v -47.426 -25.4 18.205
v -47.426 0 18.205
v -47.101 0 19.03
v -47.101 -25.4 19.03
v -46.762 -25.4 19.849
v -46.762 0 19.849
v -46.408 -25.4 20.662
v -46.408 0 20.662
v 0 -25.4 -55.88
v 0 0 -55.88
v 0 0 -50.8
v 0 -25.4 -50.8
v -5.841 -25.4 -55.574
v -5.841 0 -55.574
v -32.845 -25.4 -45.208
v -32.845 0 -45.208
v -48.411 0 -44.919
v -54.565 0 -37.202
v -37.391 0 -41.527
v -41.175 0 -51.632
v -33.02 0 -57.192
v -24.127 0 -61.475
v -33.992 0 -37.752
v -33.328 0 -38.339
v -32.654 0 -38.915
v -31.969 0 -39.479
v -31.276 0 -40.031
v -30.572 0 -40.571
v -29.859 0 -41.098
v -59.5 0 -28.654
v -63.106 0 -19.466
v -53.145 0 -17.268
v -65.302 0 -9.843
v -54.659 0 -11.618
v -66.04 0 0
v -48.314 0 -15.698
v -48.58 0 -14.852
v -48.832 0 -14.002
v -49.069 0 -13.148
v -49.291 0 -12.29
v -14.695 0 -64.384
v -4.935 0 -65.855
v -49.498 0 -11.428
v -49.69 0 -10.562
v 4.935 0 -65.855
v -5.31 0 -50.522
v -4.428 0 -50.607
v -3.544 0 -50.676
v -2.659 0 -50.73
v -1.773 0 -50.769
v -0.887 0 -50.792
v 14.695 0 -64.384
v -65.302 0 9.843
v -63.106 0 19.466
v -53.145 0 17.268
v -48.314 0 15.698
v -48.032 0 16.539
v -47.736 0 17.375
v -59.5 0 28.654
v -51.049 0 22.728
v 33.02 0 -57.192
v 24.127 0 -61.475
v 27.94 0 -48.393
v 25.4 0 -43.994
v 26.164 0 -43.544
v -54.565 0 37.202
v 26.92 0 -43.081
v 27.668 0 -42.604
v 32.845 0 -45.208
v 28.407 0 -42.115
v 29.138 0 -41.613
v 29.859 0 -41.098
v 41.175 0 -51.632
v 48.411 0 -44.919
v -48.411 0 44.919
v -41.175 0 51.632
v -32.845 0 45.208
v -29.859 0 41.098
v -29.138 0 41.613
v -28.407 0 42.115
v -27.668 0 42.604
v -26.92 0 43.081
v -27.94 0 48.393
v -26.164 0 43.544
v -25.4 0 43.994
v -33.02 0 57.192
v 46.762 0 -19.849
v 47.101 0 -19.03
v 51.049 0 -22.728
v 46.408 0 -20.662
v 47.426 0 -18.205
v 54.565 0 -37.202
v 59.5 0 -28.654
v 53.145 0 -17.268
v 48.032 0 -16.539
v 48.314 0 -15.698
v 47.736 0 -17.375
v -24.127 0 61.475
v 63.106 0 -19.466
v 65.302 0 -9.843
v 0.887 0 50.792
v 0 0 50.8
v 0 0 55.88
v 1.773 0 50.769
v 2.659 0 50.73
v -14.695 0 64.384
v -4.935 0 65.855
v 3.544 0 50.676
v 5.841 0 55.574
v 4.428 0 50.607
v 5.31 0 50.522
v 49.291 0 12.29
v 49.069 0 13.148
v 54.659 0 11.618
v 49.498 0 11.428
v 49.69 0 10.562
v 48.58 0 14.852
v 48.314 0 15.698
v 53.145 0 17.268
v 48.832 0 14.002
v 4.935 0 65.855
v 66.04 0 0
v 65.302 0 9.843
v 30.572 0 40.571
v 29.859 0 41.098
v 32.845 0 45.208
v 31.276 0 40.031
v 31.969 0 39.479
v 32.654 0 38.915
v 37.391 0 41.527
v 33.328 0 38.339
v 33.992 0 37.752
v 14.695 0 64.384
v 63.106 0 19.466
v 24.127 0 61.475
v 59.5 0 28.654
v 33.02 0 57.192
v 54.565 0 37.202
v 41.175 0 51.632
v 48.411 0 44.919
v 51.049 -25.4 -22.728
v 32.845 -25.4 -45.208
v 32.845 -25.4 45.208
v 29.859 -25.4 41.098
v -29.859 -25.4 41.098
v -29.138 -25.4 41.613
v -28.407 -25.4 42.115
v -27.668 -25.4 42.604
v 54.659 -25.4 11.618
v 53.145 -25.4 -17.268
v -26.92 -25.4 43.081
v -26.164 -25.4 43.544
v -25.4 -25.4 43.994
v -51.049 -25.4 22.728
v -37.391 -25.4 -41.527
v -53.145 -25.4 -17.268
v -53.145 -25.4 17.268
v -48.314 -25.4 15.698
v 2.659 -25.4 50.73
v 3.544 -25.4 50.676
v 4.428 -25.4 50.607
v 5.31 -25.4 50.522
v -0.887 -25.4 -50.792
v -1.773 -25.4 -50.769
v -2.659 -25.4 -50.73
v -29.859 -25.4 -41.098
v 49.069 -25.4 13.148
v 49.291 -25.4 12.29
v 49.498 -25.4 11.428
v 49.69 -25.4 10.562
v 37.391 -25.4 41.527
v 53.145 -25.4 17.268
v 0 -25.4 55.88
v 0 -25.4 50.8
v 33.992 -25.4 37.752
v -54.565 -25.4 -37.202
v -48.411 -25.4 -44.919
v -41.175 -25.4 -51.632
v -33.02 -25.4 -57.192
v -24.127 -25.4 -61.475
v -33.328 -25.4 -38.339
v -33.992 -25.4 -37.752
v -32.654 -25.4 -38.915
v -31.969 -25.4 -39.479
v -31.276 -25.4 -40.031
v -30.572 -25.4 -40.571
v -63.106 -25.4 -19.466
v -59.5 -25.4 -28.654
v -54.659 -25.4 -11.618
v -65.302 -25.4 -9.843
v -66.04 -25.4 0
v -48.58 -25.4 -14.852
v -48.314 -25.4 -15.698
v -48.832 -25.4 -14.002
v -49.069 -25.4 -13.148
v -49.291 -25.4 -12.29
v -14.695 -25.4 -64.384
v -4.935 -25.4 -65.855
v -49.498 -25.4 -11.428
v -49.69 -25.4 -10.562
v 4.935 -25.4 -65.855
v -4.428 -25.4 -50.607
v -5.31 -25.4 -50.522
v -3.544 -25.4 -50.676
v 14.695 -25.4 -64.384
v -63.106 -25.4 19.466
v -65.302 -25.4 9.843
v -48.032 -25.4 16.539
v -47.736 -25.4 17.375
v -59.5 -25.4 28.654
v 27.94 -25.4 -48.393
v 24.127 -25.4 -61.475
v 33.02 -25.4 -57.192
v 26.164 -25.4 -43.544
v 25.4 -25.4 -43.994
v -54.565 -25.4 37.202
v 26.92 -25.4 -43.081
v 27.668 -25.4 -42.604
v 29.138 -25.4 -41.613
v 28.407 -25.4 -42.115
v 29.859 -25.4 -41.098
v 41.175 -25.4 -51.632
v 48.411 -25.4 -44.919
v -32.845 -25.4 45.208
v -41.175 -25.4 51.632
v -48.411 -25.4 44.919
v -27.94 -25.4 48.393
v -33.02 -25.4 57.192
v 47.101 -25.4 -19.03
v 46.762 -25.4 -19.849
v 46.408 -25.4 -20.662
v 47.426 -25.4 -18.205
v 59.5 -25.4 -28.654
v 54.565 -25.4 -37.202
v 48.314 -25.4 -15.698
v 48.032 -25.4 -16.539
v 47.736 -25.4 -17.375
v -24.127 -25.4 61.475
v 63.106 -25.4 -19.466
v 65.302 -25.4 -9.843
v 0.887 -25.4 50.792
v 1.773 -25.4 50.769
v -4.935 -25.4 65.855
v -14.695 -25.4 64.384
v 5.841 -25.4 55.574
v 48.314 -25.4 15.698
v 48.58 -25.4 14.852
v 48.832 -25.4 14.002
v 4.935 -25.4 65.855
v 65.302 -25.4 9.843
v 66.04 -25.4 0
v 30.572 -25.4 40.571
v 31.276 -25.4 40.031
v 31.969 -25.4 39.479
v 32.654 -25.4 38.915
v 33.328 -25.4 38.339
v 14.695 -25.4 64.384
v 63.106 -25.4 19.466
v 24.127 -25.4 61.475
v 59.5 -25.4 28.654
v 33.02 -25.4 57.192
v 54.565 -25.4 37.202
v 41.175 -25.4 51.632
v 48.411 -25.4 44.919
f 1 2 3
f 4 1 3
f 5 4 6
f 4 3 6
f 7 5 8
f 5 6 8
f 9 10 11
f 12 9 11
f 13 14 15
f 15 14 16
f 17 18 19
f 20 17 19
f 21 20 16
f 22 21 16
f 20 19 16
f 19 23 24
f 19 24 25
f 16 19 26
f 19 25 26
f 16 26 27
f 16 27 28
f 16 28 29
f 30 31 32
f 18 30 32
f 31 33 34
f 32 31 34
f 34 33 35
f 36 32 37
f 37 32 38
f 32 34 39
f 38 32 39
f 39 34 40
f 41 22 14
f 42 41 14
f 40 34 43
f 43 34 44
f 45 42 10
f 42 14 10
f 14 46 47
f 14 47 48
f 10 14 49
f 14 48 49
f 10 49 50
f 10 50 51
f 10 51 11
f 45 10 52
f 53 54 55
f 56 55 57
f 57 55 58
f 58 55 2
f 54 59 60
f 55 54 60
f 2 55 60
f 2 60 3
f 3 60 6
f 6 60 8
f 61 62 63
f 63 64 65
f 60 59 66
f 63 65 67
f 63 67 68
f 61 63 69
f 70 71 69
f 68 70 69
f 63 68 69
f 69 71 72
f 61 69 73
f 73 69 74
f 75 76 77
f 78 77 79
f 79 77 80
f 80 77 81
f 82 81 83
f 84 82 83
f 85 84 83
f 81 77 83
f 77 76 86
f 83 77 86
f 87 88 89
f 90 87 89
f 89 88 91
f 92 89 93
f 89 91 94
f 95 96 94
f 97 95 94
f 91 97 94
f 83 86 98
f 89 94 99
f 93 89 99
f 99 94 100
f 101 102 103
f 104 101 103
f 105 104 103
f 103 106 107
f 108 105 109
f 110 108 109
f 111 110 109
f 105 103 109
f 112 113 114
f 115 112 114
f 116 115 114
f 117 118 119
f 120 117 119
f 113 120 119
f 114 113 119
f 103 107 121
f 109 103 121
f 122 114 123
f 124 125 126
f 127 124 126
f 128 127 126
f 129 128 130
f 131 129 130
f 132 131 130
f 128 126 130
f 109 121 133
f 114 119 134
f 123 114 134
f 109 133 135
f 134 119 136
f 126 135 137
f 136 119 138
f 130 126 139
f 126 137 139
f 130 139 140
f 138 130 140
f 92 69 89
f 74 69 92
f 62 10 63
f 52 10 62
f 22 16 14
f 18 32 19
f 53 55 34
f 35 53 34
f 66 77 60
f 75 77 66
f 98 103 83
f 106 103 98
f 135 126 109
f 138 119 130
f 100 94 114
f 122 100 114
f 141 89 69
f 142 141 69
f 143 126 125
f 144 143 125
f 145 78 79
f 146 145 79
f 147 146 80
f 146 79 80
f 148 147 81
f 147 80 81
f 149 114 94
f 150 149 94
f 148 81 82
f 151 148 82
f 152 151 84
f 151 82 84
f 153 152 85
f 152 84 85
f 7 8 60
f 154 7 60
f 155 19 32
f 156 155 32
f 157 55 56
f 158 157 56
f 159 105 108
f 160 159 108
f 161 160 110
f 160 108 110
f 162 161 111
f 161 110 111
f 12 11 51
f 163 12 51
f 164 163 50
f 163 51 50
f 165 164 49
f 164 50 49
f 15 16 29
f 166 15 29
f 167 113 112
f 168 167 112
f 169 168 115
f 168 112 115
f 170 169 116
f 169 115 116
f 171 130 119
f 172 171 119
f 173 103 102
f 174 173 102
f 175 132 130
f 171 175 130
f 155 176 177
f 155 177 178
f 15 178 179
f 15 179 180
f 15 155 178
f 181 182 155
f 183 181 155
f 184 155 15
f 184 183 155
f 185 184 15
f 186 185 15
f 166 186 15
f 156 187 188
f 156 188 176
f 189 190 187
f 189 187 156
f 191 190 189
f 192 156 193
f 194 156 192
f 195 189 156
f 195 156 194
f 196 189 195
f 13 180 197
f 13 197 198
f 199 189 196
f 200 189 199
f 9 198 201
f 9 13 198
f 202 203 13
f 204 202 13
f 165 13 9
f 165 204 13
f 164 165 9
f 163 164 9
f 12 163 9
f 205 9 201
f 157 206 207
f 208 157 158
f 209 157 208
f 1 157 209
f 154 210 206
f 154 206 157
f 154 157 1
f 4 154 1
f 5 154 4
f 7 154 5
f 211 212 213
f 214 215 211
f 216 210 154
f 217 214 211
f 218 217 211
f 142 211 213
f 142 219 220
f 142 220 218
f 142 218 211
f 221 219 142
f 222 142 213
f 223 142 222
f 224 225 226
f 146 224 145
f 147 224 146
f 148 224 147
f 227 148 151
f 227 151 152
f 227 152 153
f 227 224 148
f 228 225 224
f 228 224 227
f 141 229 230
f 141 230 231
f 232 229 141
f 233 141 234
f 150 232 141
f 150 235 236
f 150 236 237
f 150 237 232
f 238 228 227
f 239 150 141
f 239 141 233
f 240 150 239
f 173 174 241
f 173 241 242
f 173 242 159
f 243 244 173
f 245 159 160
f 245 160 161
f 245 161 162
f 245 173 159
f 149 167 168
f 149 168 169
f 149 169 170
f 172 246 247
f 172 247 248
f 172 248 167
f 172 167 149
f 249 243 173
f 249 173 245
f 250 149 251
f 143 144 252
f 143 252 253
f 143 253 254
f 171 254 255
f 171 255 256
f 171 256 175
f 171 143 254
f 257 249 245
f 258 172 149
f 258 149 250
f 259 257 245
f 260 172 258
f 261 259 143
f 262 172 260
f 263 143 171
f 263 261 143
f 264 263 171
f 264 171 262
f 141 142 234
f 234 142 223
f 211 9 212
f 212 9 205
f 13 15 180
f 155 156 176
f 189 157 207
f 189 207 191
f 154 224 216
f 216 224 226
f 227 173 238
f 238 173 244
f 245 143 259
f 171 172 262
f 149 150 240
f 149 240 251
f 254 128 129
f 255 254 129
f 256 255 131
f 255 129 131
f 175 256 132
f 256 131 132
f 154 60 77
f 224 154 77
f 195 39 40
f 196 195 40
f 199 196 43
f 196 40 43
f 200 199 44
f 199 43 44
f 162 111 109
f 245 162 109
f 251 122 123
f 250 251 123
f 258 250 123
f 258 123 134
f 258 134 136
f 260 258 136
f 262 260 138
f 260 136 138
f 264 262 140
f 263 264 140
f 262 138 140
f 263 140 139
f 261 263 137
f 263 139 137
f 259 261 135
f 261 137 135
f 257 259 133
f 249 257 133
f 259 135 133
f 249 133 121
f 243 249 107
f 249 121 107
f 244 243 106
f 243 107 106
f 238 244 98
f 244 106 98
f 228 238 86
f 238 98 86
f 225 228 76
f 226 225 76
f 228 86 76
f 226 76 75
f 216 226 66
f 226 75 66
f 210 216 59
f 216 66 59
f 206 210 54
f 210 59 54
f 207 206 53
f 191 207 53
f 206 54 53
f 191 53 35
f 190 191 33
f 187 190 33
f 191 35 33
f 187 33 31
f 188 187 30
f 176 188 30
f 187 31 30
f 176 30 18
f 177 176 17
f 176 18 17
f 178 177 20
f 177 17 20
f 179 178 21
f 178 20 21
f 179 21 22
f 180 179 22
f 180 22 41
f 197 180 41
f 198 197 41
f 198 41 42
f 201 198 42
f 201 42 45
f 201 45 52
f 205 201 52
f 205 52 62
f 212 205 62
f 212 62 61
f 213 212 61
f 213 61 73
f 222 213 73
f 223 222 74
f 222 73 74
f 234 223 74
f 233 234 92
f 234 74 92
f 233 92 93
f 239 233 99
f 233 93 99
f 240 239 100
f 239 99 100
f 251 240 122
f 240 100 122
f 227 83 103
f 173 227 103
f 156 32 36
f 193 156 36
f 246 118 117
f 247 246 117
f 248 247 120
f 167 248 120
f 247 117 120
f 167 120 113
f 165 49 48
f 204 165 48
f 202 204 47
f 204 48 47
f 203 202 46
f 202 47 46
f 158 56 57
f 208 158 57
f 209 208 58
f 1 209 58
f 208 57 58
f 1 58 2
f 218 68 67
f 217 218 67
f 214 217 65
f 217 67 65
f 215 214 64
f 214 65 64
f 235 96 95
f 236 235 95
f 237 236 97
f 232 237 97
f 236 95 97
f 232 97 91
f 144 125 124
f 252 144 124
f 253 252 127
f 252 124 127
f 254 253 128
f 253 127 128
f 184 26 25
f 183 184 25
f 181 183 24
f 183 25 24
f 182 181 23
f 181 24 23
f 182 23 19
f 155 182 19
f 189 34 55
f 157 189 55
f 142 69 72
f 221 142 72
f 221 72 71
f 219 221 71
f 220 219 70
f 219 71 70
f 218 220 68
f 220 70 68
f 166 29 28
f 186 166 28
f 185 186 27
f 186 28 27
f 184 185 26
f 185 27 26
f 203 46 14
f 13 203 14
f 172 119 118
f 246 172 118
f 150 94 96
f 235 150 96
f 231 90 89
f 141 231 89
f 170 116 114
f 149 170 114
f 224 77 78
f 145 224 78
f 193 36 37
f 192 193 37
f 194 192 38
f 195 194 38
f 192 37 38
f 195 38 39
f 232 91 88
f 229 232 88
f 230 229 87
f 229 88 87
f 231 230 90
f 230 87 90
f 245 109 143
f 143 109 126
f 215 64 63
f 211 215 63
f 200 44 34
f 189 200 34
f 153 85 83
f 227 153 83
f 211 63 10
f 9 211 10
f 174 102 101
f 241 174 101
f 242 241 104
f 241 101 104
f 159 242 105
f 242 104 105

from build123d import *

# Parameters (mm, degrees)
F0_R     = 66.04
F1_DEPTH = 25.4


with BuildPart() as f1:
    # F0 (on Front) → F1 (new body)
    with BuildSketch(Plane.XZ):
        Circle(F0_R)
        with BuildLine():
            ThreePointArc((53.975935173, 14.4628082403), (54.3360311518, 13.0449269323), (54.658887929, 11.6181052829))
            ThreePointArc((54.658887929, 11.6181052829), (55.5738835132, 5.8410505274), (55.88, 0))
            ThreePointArc((55.88, 0), (55.1920244725, -8.7415579064), (53.1450381306, -17.2678696457))
            ThreePointArc((53.1450381306, -17.2678696457), (52.6748065222, -18.653127294), (52.1684742327, -20.0256010206))
            ThreePointArc((52.1684742327, -20.0256010206), (51.6263882767, -21.3843502006), (51.0489201731, -22.7284436151))
            ThreePointArc((51.0489201731, -22.7284436151), (43.4269163262, -35.1664234519), (32.8454398981, -45.2078696457))
            ThreePointArc((32.8454398981, -45.2078696457), (31.6507805194, -46.0521714202), (30.4344292766, -46.8649113368))
            ThreePointArc((30.4344292766, -46.8649113368), (29.1972197963, -47.6455323841), (27.94, -48.3934995635))
            ThreePointArc((27.94, -48.3934995635), (14.4628082403, -53.975935173), (0, -55.88))
            ThreePointArc((0, -55.88), (-1.4627678714, -55.8608513196), (-2.9245332349, -55.8034184021))
            ThreePointArc((-2.9245332349, -55.8034184021), (-4.3842942693, -55.707740609), (-5.8410505274, -55.5738835132))
            ThreePointArc((-5.8410505274, -55.5738835132), (-20.0256010206, -52.1684742327), (-32.8454398981, -45.2078696457))
            ThreePointArc((-32.8454398981, -45.2078696457), (-34.017588653, -44.3325846555), (-35.1664234519, -43.4269163262))
            ThreePointArc((-35.1664234519, -43.4269163262), (-36.2911569407, -42.4914853577), (-37.3910182833, -41.5269328477))
            ThreePointArc((-37.3910182833, -41.5269328477), (-46.8649113368, -30.4344292766), (-53.1450381306, -17.2678696457))
            ThreePointArc((-53.1450381306, -17.2678696457), (-53.5788467844, -15.8707774621), (-53.975935173, -14.4628082403))
            ThreePointArc((-53.975935173, -14.4628082403), (-54.3360311518, -13.0449269323), (-54.658887929, -11.6181052829))
            ThreePointArc((-54.658887929, -11.6181052829), (-55.8034184021, 2.9245332349), (-53.1450381306, 17.2678696457))
            ThreePointArc((-53.1450381306, 17.2678696457), (-52.6748065222, 18.653127294), (-52.1684742327, 20.0256010206))
            ThreePointArc((-52.1684742327, 20.0256010206), (-51.6263882767, 21.3843502006), (-51.0489201731, 22.7284436151))
            ThreePointArc((-51.0489201731, 22.7284436151), (-43.4269163262, 35.1664234519), (-32.8454398981, 45.2078696457))
            ThreePointArc((-32.8454398981, 45.2078696457), (-31.6507805194, 46.0521714202), (-30.4344292766, 46.8649113368))
            ThreePointArc((-30.4344292766, 46.8649113368), (-29.1972197963, 47.6455323841), (-27.94, 48.3934995635))
            ThreePointArc((-27.94, 48.3934995635), (-14.4628082403, 53.975935173), (0, 55.88))
            ThreePointArc((0, 55.88), (1.4627678714, 55.8608513196), (2.9245332349, 55.8034184021))
            ThreePointArc((2.9245332349, 55.8034184021), (4.3842942693, 55.707740609), (5.8410505274, 55.5738835132))
            ThreePointArc((5.8410505274, 55.5738835132), (20.0256010206, 52.1684742327), (32.8454398981, 45.2078696457))
            ThreePointArc((32.8454398981, 45.2078696457), (34.017588653, 44.3325846555), (35.1664234519, 43.4269163262))
            ThreePointArc((35.1664234519, 43.4269163262), (36.2911569407, 42.4914853577), (37.3910182833, 41.5269328477))
            ThreePointArc((37.3910182833, 41.5269328477), (46.8649113368, 30.4344292766), (53.1450381306, 17.2678696457))
            ThreePointArc((53.1450381306, 17.2678696457), (53.5788467844, 15.8707774621), (53.975935173, 14.4628082403))
        make_face(mode=Mode.SUBTRACT)
        with BuildLine():
            Line((-52.1684742327, 20.0256010206), (-47.4258856661, 18.2050918369))
            ThreePointArc((-47.4258856661, 18.2050918369), (-46.9330802516, 19.4403183641), (-46.4081092482, 20.6622214682))
            Line((-46.4081092482, 20.6622214683), (-51.0489201731, 22.7284436151))
            ThreePointArc((-51.0489201731, 22.7284436151), (-51.6263882767, 21.3843502006), (-52.1684742327, 20.0256010206))
        make_face()
        with BuildLine():
            ThreePointArc((-48.3136710278, 15.6980633142), (-47.8861877475, 16.9573884491), (-47.4258856661, 18.2050918369))
            Line((-47.4258856661, 18.2050918369), (-52.1684742327, 20.0256010206))
            ThreePointArc((-52.1684742327, 20.0256010206), (-52.6748065222, 18.653127294), (-53.1450381306, 17.2678696457))
            Line((-53.1450381306, 17.2678696457), (-48.3136710278, 15.6980633142))
        make_face()
        with BuildLine():
            Line((-30.4344292766, 46.8649113368), (-27.6676629788, 42.6044648516))
            ThreePointArc((-27.6676629788, 42.6044648516), (-26.5429270876, 43.3141203492), (-25.4, 43.9940905122))
            Line((-25.4, 43.9940905122), (-27.94, 48.3934995635))
            ThreePointArc((-27.94, 48.3934995635), (-29.1972197963, 47.6455323841), (-30.4344292766, 46.8649113368))
        make_face()
        with BuildLine():
            ThreePointArc((-29.8594908165, 41.0980633142), (-28.7734368358, 41.865610382), (-27.6676629788, 42.6044648516))
            Line((-27.6676629788, 42.6044648516), (-30.4344292766, 46.8649113368))
            ThreePointArc((-30.4344292766, 46.8649113368), (-31.6507805194, 46.0521714202), (-32.8454398981, 45.2078696457))
            Line((-32.8454398981, 45.2078696457), (-29.8594908165, 41.0980633142))
        make_face()
        with BuildLine():
            Line((2.9245332349, 55.8034184021), (2.6586665771, 50.7303803655))
            ThreePointArc((2.6586665771, 50.7303803655), (3.985722063, 50.6434005536), (5.310045934, 50.5217122847))
            Line((5.310045934, 50.5217122847), (5.8410505274, 55.5738835132))
            ThreePointArc((5.8410505274, 55.5738835132), (4.3842942693, 55.707740609), (2.9245332349, 55.8034184021))
        make_face()
        with BuildLine():
            ThreePointArc((0, 50.8), (1.329788974, 50.7825921088), (2.6586665771, 50.7303803655))
            Line((2.6586665771, 50.7303803655), (2.9245332349, 55.8034184021))
            ThreePointArc((2.9245332349, 55.8034184021), (1.4627678714, 55.8608513196), (0, 55.88))
            Line((0, 55.88), (0, 50.8))
        make_face()
        with BuildLine():
            ThreePointArc((29.8594908165, 41.0980633142), (30.9250805936, 40.3023496868), (31.9694758653, 39.479014842))
            Line((31.9694758653, 39.479014842), (35.1664234519, 43.4269163262))
            ThreePointArc((35.1664234519, 43.4269163262), (34.017588653, 44.3325846555), (32.8454398981, 45.2078696457))
            Line((32.8454398981, 45.2078696457), (29.8594908165, 41.0980633142))
        make_face()
        with BuildLine():
            Line((35.1664234519, 43.4269163262), (31.9694758653, 39.479014842))
            ThreePointArc((31.9694758653, 39.479014842), (32.9919608552, 38.6286230525), (33.991834803, 37.7517571343))
            Line((33.991834803, 37.7517571343), (37.3910182833, 41.5269328477))
            ThreePointArc((37.3910182833, 41.5269328477), (36.2911569407, 42.4914853577), (35.1664234519, 43.4269163262))
        make_face()
        with BuildLine():
            ThreePointArc((48.3136710278, 15.6980633142), (48.7080425313, 14.427979511), (49.0690319755, 13.1480074912))
            Line((49.0690319755, 13.1480074912), (53.975935173, 14.4628082403))
            ThreePointArc((53.975935173, 14.4628082403), (53.5788467844, 15.8707774621), (53.1450381306, 17.2678696457))
            Line((53.1450381306, 17.2678696457), (48.3136710278, 15.6980633142))
        make_face()
        with BuildLine():
            ThreePointArc((49.0690319755, 13.1480074912), (49.3963919562, 11.8590244839), (49.6898981173, 10.5619138935))
            Line((49.6898981173, 10.5619138935), (54.658887929, 11.6181052829))
            ThreePointArc((54.658887929, 11.6181052829), (54.3360311518, 13.0449269323), (53.975935173, 14.4628082403))
            Line((53.975935173, 14.4628082403), (49.0690319755, 13.1480074912))
        make_face()
        with BuildLine():
            Line((53.1450381306, -17.2678696457), (48.3136710278, -15.6980633142))
            ThreePointArc((48.3136710278, -15.6980633142), (47.8861877475, -16.9573884491), (47.4258856661, -18.2050918369))
            Line((47.4258856661, -18.2050918369), (52.1684742327, -20.0256010206))
            ThreePointArc((52.1684742327, -20.0256010206), (52.6748065222, -18.653127294), (53.1450381306, -17.2678696457))
        make_face()
        with BuildLine():
            Line((52.1684742327, -20.0256010206), (47.4258856661, -18.2050918369))
            ThreePointArc((47.4258856661, -18.2050918369), (46.9330802516, -19.4403183641), (46.4081092482, -20.6622214682))
            Line((46.4081092482, -20.6622214683), (51.0489201731, -22.7284436151))
            ThreePointArc((51.0489201731, -22.7284436151), (51.6263882767, -21.3843502006), (52.1684742327, -20.0256010206))
        make_face()
        with BuildLine():
            ThreePointArc((29.8594908165, -41.0980633142), (28.7734368358, -41.865610382), (27.6676629788, -42.6044648516))
            Line((27.6676629788, -42.6044648516), (30.4344292766, -46.8649113368))
            ThreePointArc((30.4344292766, -46.8649113368), (31.6507805194, -46.0521714202), (32.8454398981, -45.2078696457))
            Line((32.8454398981, -45.2078696457), (29.8594908165, -41.0980633142))
        make_face()
        with BuildLine():
            Line((30.4344292766, -46.8649113368), (27.6676629788, -42.6044648516))
            ThreePointArc((27.6676629788, -42.6044648516), (26.5429270876, -43.3141203492), (25.4, -43.9940905122))
            Line((25.4, -43.9940905122), (27.94, -48.3934995635))
            ThreePointArc((27.94, -48.3934995635), (29.1972197963, -47.6455323841), (30.4344292766, -46.8649113368))
        make_face()
        with BuildLine():
            ThreePointArc((0, -50.8), (-1.329788974, -50.7825921088), (-2.6586665771, -50.7303803655))
            Line((-2.6586665771, -50.7303803655), (-2.9245332349, -55.8034184021))
            ThreePointArc((-2.9245332349, -55.8034184021), (-1.4627678714, -55.8608513196), (0, -55.88))
            Line((0, -55.88), (0, -50.8))
        make_face()
        with BuildLine():
            Line((-2.9245332349, -55.8034184021), (-2.6586665771, -50.7303803655))
            ThreePointArc((-2.6586665771, -50.7303803655), (-3.985722063, -50.6434005536), (-5.310045934, -50.5217122847))
            Line((-5.310045934, -50.5217122847), (-5.8410505274, -55.5738835132))
            ThreePointArc((-5.8410505274, -55.5738835132), (-4.3842942693, -55.707740609), (-2.9245332349, -55.8034184021))
        make_face()
        with BuildLine():
            ThreePointArc((-29.8594908165, -41.0980633142), (-30.9250805936, -40.3023496868), (-31.9694758653, -39.479014842))
            Line((-31.9694758653, -39.479014842), (-35.1664234519, -43.4269163262))
            ThreePointArc((-35.1664234519, -43.4269163262), (-34.017588653, -44.3325846555), (-32.8454398981, -45.2078696457))
            Line((-32.8454398981, -45.2078696457), (-29.8594908165, -41.0980633142))
        make_face()
        with BuildLine():
            Line((-35.1664234519, -43.4269163262), (-31.9694758653, -39.479014842))
            ThreePointArc((-31.9694758653, -39.479014842), (-32.9919608552, -38.6286230525), (-33.991834803, -37.7517571343))
            Line((-33.991834803, -37.7517571343), (-37.3910182833, -41.5269328477))
            ThreePointArc((-37.3910182833, -41.5269328477), (-36.2911569407, -42.4914853577), (-35.1664234519, -43.4269163262))
        make_face()
        with BuildLine():
            ThreePointArc((-48.3136710278, -15.6980633142), (-48.7080425313, -14.427979511), (-49.0690319755, -13.1480074912))
            Line((-49.0690319755, -13.1480074912), (-53.975935173, -14.4628082403))
            ThreePointArc((-53.975935173, -14.4628082403), (-53.5788467844, -15.8707774621), (-53.1450381306, -17.2678696457))
            Line((-53.1450381306, -17.2678696457), (-48.3136710278, -15.6980633142))
        make_face()
        with BuildLine():
            Line((-53.975935173, -14.4628082403), (-49.0690319755, -13.1480074912))
            ThreePointArc((-49.0690319755, -13.1480074912), (-49.3963919562, -11.8590244839), (-49.6898981173, -10.5619138935))
            Line((-49.6898981173, -10.5619138935), (-54.658887929, -11.6181052829))
            ThreePointArc((-54.658887929, -11.6181052829), (-54.3360311518, -13.0449269323), (-53.975935173, -14.4628082403))
        make_face()
        with BuildLine():
            ThreePointArc((-53.1450381306, -17.2678696457), (-46.8649113368, -30.4344292766), (-37.3910182833, -41.5269328477))
            Line((-37.3910182833, -41.5269328477), (-53.1450381306, -17.2678696457))
        make_face()
        with BuildLine():
            ThreePointArc((-53.1450381306, 17.2678696457), (-55.8034184021, 2.9245332349), (-54.658887929, -11.6181052829))
            Line((-54.658887929, -11.6181052829), (-53.1450381306, 17.2678696457))
        make_face()
        with BuildLine():
            Line((-51.0489201731, 22.7284436151), (-32.8454398981, 45.2078696457))
            ThreePointArc((-32.8454398981, 45.2078696457), (-43.4269163262, 35.1664234519), (-51.0489201731, 22.7284436151))
        make_face()
        with BuildLine():
            ThreePointArc((0, 55.88), (-14.4628082403, 53.975935173), (-27.94, 48.3934995635))
            Line((-27.94, 48.3934995635), (0, 55.88))
        make_face()
        with BuildLine():
            ThreePointArc((32.8454398981, 45.2078696457), (20.0256010206, 52.1684742327), (5.8410505274, 55.5738835132))
            Line((5.8410505274, 55.5738835132), (32.8454398981, 45.2078696457))
        make_face()
        with BuildLine():
            Line((37.3910182833, 41.5269328477), (53.1450381306, 17.2678696457))
            ThreePointArc((53.1450381306, 17.2678696457), (46.8649113368, 30.4344292766), (37.3910182833, 41.5269328477))
        make_face()
        with BuildLine():
            ThreePointArc((55.88, 0), (55.5738835132, 5.8410505274), (54.658887929, 11.6181052829))
            Line((54.658887929, 11.6181052829), (53.1450381306, -17.2678696457))
            ThreePointArc((53.1450381306, -17.2678696457), (55.1920244725, -8.7415579064), (55.88, 0))
        make_face()
        with BuildLine():
            ThreePointArc((32.8454398981, -45.2078696457), (43.4269163262, -35.1664234519), (51.0489201731, -22.7284436151))
            Line((51.0489201731, -22.7284436151), (32.8454398981, -45.2078696457))
        make_face()
        with BuildLine():
            ThreePointArc((0, -55.88), (14.4628082403, -53.975935173), (27.94, -48.3934995635))
            Line((27.94, -48.3934995635), (0, -55.88))
        make_face()
        with BuildLine():
            ThreePointArc((-32.8454398981, -45.2078696457), (-20.0256010206, -52.1684742327), (-5.8410505274, -55.5738835132))
            Line((-5.8410505274, -55.5738835132), (-32.8454398981, -45.2078696457))
        make_face()
    extrude(amount=F1_DEPTH)


solid = f1.part
